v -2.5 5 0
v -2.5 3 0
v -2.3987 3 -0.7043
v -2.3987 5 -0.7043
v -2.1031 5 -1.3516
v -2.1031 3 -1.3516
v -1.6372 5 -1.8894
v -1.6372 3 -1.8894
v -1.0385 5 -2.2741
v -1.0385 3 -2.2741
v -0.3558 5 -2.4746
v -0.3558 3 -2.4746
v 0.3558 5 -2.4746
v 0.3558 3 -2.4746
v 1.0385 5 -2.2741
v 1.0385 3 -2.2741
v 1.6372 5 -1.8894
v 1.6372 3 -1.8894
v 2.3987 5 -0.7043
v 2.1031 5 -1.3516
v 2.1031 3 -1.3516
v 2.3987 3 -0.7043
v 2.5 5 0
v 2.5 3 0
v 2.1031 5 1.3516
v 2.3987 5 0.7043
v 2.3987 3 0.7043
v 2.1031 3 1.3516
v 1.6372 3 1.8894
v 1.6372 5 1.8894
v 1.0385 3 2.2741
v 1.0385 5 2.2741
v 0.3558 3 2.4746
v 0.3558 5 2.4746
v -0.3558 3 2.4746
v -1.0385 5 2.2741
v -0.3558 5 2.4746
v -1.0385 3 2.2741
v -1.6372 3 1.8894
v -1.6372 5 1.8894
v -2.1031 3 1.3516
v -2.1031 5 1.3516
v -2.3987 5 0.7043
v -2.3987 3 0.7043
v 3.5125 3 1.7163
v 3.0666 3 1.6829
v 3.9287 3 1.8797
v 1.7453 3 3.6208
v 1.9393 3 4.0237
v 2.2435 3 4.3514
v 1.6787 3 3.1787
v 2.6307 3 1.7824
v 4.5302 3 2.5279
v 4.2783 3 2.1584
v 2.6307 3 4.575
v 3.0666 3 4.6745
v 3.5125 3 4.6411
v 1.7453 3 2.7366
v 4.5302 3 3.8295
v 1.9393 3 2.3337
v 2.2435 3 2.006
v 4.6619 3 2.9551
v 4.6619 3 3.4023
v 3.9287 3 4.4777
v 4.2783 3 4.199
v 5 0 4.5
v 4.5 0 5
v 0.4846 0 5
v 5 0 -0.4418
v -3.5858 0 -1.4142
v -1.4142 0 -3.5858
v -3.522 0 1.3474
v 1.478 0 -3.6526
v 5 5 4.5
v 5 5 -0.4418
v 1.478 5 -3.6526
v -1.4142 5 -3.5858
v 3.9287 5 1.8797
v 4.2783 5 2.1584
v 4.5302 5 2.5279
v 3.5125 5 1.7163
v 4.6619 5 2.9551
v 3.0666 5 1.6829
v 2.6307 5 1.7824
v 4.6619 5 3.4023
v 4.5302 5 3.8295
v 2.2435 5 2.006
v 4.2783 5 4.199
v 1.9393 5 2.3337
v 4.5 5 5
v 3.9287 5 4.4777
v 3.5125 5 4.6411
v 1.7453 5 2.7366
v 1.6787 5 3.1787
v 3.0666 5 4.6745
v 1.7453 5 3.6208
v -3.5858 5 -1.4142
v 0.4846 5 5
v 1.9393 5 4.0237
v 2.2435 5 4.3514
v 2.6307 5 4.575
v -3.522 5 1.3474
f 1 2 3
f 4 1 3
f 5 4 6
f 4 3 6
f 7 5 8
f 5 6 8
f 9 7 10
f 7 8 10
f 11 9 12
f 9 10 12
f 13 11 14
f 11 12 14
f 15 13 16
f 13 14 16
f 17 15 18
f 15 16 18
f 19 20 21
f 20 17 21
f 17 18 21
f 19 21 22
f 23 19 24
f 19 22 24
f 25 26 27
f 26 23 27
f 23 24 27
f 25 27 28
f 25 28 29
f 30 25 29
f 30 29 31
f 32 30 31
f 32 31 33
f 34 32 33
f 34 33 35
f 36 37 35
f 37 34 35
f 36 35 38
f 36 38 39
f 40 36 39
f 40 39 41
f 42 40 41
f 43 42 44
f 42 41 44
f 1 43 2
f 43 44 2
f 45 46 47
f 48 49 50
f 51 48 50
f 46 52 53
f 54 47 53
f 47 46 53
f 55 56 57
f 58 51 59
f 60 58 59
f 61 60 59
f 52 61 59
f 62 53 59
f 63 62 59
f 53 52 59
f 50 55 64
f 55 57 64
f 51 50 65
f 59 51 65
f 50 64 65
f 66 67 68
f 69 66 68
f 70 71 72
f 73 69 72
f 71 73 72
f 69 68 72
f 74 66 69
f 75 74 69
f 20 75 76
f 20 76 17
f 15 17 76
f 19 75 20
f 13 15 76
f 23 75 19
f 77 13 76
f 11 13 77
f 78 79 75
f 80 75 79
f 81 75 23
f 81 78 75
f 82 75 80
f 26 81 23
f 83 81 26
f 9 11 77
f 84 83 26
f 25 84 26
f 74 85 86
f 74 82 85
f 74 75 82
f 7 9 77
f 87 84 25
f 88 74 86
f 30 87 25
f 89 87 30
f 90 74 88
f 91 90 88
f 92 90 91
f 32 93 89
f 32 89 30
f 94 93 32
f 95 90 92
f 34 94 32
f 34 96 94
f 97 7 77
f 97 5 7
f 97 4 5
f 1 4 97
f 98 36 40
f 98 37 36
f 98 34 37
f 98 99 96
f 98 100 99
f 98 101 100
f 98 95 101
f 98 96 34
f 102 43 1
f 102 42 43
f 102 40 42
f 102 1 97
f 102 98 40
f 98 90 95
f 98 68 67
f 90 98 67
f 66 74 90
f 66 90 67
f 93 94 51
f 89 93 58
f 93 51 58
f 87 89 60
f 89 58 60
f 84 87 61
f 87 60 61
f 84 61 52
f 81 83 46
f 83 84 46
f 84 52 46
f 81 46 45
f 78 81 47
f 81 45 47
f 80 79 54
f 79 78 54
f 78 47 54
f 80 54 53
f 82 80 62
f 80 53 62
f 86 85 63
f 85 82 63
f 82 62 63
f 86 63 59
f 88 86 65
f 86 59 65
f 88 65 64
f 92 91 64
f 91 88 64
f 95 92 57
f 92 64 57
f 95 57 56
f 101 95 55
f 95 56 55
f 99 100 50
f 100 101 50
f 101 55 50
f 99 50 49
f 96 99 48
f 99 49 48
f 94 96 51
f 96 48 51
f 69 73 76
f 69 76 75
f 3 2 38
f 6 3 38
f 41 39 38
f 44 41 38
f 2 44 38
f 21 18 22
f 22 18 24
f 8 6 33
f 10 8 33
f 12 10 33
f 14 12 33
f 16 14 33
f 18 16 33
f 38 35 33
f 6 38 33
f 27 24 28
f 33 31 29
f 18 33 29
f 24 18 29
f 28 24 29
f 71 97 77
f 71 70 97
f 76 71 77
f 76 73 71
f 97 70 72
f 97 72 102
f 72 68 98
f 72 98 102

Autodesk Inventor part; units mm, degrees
ref_plane "YZ Plane" through (0, 0, 0) normal (1, 0, 0) x (0, 1, 0)
ref_plane "XZ Plane" through (0, 0, 0) normal (0, 1, 0) x (-1, 0, 0)
ref_plane "XY Plane" through (0, 0, 0) normal (0, 0, 1) x (1, 0, 0)
sketch "Sketch1" plane through (0, 0, 0) normal (0, 1, 0) x (-1, 0, 0)
  line L0 (-0.4846, 5) -> (-5, 5)
  line L1 (-5, 5) -> (-5, -0.4418)
  line L2 (2.3844, 2.3844) -> (-2.6156, -2.6156) construction
  line L3 (-5, 5) -> (2.5, -2.5) construction
  circle A0 centre (0, 0) radius 2.5
  circle A1 centre (-3.1787, 3.1787) radius 1.5
  line L4 (-0.4846, 5) -> (5, 0)
  line L5 (5, 0) -> (0, -5)
  line L6 (0, -5) -> (-5, -0.4418)
  dimension "d2" = 5
  dimension "d3" = 3
extrude "Extrusion1" add sketch "Sketch1" along normal blind 5
sketch "Sketch2" plane through (0, 0, 0) normal (0, -1, 0) x (1, 0, 0)
  circle A0 centre (0, 0) radius 2.5 projected
  circle A1 centre (3.1787, 3.1787) radius 1.5 projected
extrude "Extrusion2" add sketch "Sketch2" against normal blind 3
chamfer "Chamfer1" distance 2 angle 45 2 edges at (0, 2.5, -5) (-5, 2.5, 0)
chamfer "Chamfer2" distance 0.5 angle 45 1 edges at (5, 2.5, 5)
properties part number "test_fit_3_5"
